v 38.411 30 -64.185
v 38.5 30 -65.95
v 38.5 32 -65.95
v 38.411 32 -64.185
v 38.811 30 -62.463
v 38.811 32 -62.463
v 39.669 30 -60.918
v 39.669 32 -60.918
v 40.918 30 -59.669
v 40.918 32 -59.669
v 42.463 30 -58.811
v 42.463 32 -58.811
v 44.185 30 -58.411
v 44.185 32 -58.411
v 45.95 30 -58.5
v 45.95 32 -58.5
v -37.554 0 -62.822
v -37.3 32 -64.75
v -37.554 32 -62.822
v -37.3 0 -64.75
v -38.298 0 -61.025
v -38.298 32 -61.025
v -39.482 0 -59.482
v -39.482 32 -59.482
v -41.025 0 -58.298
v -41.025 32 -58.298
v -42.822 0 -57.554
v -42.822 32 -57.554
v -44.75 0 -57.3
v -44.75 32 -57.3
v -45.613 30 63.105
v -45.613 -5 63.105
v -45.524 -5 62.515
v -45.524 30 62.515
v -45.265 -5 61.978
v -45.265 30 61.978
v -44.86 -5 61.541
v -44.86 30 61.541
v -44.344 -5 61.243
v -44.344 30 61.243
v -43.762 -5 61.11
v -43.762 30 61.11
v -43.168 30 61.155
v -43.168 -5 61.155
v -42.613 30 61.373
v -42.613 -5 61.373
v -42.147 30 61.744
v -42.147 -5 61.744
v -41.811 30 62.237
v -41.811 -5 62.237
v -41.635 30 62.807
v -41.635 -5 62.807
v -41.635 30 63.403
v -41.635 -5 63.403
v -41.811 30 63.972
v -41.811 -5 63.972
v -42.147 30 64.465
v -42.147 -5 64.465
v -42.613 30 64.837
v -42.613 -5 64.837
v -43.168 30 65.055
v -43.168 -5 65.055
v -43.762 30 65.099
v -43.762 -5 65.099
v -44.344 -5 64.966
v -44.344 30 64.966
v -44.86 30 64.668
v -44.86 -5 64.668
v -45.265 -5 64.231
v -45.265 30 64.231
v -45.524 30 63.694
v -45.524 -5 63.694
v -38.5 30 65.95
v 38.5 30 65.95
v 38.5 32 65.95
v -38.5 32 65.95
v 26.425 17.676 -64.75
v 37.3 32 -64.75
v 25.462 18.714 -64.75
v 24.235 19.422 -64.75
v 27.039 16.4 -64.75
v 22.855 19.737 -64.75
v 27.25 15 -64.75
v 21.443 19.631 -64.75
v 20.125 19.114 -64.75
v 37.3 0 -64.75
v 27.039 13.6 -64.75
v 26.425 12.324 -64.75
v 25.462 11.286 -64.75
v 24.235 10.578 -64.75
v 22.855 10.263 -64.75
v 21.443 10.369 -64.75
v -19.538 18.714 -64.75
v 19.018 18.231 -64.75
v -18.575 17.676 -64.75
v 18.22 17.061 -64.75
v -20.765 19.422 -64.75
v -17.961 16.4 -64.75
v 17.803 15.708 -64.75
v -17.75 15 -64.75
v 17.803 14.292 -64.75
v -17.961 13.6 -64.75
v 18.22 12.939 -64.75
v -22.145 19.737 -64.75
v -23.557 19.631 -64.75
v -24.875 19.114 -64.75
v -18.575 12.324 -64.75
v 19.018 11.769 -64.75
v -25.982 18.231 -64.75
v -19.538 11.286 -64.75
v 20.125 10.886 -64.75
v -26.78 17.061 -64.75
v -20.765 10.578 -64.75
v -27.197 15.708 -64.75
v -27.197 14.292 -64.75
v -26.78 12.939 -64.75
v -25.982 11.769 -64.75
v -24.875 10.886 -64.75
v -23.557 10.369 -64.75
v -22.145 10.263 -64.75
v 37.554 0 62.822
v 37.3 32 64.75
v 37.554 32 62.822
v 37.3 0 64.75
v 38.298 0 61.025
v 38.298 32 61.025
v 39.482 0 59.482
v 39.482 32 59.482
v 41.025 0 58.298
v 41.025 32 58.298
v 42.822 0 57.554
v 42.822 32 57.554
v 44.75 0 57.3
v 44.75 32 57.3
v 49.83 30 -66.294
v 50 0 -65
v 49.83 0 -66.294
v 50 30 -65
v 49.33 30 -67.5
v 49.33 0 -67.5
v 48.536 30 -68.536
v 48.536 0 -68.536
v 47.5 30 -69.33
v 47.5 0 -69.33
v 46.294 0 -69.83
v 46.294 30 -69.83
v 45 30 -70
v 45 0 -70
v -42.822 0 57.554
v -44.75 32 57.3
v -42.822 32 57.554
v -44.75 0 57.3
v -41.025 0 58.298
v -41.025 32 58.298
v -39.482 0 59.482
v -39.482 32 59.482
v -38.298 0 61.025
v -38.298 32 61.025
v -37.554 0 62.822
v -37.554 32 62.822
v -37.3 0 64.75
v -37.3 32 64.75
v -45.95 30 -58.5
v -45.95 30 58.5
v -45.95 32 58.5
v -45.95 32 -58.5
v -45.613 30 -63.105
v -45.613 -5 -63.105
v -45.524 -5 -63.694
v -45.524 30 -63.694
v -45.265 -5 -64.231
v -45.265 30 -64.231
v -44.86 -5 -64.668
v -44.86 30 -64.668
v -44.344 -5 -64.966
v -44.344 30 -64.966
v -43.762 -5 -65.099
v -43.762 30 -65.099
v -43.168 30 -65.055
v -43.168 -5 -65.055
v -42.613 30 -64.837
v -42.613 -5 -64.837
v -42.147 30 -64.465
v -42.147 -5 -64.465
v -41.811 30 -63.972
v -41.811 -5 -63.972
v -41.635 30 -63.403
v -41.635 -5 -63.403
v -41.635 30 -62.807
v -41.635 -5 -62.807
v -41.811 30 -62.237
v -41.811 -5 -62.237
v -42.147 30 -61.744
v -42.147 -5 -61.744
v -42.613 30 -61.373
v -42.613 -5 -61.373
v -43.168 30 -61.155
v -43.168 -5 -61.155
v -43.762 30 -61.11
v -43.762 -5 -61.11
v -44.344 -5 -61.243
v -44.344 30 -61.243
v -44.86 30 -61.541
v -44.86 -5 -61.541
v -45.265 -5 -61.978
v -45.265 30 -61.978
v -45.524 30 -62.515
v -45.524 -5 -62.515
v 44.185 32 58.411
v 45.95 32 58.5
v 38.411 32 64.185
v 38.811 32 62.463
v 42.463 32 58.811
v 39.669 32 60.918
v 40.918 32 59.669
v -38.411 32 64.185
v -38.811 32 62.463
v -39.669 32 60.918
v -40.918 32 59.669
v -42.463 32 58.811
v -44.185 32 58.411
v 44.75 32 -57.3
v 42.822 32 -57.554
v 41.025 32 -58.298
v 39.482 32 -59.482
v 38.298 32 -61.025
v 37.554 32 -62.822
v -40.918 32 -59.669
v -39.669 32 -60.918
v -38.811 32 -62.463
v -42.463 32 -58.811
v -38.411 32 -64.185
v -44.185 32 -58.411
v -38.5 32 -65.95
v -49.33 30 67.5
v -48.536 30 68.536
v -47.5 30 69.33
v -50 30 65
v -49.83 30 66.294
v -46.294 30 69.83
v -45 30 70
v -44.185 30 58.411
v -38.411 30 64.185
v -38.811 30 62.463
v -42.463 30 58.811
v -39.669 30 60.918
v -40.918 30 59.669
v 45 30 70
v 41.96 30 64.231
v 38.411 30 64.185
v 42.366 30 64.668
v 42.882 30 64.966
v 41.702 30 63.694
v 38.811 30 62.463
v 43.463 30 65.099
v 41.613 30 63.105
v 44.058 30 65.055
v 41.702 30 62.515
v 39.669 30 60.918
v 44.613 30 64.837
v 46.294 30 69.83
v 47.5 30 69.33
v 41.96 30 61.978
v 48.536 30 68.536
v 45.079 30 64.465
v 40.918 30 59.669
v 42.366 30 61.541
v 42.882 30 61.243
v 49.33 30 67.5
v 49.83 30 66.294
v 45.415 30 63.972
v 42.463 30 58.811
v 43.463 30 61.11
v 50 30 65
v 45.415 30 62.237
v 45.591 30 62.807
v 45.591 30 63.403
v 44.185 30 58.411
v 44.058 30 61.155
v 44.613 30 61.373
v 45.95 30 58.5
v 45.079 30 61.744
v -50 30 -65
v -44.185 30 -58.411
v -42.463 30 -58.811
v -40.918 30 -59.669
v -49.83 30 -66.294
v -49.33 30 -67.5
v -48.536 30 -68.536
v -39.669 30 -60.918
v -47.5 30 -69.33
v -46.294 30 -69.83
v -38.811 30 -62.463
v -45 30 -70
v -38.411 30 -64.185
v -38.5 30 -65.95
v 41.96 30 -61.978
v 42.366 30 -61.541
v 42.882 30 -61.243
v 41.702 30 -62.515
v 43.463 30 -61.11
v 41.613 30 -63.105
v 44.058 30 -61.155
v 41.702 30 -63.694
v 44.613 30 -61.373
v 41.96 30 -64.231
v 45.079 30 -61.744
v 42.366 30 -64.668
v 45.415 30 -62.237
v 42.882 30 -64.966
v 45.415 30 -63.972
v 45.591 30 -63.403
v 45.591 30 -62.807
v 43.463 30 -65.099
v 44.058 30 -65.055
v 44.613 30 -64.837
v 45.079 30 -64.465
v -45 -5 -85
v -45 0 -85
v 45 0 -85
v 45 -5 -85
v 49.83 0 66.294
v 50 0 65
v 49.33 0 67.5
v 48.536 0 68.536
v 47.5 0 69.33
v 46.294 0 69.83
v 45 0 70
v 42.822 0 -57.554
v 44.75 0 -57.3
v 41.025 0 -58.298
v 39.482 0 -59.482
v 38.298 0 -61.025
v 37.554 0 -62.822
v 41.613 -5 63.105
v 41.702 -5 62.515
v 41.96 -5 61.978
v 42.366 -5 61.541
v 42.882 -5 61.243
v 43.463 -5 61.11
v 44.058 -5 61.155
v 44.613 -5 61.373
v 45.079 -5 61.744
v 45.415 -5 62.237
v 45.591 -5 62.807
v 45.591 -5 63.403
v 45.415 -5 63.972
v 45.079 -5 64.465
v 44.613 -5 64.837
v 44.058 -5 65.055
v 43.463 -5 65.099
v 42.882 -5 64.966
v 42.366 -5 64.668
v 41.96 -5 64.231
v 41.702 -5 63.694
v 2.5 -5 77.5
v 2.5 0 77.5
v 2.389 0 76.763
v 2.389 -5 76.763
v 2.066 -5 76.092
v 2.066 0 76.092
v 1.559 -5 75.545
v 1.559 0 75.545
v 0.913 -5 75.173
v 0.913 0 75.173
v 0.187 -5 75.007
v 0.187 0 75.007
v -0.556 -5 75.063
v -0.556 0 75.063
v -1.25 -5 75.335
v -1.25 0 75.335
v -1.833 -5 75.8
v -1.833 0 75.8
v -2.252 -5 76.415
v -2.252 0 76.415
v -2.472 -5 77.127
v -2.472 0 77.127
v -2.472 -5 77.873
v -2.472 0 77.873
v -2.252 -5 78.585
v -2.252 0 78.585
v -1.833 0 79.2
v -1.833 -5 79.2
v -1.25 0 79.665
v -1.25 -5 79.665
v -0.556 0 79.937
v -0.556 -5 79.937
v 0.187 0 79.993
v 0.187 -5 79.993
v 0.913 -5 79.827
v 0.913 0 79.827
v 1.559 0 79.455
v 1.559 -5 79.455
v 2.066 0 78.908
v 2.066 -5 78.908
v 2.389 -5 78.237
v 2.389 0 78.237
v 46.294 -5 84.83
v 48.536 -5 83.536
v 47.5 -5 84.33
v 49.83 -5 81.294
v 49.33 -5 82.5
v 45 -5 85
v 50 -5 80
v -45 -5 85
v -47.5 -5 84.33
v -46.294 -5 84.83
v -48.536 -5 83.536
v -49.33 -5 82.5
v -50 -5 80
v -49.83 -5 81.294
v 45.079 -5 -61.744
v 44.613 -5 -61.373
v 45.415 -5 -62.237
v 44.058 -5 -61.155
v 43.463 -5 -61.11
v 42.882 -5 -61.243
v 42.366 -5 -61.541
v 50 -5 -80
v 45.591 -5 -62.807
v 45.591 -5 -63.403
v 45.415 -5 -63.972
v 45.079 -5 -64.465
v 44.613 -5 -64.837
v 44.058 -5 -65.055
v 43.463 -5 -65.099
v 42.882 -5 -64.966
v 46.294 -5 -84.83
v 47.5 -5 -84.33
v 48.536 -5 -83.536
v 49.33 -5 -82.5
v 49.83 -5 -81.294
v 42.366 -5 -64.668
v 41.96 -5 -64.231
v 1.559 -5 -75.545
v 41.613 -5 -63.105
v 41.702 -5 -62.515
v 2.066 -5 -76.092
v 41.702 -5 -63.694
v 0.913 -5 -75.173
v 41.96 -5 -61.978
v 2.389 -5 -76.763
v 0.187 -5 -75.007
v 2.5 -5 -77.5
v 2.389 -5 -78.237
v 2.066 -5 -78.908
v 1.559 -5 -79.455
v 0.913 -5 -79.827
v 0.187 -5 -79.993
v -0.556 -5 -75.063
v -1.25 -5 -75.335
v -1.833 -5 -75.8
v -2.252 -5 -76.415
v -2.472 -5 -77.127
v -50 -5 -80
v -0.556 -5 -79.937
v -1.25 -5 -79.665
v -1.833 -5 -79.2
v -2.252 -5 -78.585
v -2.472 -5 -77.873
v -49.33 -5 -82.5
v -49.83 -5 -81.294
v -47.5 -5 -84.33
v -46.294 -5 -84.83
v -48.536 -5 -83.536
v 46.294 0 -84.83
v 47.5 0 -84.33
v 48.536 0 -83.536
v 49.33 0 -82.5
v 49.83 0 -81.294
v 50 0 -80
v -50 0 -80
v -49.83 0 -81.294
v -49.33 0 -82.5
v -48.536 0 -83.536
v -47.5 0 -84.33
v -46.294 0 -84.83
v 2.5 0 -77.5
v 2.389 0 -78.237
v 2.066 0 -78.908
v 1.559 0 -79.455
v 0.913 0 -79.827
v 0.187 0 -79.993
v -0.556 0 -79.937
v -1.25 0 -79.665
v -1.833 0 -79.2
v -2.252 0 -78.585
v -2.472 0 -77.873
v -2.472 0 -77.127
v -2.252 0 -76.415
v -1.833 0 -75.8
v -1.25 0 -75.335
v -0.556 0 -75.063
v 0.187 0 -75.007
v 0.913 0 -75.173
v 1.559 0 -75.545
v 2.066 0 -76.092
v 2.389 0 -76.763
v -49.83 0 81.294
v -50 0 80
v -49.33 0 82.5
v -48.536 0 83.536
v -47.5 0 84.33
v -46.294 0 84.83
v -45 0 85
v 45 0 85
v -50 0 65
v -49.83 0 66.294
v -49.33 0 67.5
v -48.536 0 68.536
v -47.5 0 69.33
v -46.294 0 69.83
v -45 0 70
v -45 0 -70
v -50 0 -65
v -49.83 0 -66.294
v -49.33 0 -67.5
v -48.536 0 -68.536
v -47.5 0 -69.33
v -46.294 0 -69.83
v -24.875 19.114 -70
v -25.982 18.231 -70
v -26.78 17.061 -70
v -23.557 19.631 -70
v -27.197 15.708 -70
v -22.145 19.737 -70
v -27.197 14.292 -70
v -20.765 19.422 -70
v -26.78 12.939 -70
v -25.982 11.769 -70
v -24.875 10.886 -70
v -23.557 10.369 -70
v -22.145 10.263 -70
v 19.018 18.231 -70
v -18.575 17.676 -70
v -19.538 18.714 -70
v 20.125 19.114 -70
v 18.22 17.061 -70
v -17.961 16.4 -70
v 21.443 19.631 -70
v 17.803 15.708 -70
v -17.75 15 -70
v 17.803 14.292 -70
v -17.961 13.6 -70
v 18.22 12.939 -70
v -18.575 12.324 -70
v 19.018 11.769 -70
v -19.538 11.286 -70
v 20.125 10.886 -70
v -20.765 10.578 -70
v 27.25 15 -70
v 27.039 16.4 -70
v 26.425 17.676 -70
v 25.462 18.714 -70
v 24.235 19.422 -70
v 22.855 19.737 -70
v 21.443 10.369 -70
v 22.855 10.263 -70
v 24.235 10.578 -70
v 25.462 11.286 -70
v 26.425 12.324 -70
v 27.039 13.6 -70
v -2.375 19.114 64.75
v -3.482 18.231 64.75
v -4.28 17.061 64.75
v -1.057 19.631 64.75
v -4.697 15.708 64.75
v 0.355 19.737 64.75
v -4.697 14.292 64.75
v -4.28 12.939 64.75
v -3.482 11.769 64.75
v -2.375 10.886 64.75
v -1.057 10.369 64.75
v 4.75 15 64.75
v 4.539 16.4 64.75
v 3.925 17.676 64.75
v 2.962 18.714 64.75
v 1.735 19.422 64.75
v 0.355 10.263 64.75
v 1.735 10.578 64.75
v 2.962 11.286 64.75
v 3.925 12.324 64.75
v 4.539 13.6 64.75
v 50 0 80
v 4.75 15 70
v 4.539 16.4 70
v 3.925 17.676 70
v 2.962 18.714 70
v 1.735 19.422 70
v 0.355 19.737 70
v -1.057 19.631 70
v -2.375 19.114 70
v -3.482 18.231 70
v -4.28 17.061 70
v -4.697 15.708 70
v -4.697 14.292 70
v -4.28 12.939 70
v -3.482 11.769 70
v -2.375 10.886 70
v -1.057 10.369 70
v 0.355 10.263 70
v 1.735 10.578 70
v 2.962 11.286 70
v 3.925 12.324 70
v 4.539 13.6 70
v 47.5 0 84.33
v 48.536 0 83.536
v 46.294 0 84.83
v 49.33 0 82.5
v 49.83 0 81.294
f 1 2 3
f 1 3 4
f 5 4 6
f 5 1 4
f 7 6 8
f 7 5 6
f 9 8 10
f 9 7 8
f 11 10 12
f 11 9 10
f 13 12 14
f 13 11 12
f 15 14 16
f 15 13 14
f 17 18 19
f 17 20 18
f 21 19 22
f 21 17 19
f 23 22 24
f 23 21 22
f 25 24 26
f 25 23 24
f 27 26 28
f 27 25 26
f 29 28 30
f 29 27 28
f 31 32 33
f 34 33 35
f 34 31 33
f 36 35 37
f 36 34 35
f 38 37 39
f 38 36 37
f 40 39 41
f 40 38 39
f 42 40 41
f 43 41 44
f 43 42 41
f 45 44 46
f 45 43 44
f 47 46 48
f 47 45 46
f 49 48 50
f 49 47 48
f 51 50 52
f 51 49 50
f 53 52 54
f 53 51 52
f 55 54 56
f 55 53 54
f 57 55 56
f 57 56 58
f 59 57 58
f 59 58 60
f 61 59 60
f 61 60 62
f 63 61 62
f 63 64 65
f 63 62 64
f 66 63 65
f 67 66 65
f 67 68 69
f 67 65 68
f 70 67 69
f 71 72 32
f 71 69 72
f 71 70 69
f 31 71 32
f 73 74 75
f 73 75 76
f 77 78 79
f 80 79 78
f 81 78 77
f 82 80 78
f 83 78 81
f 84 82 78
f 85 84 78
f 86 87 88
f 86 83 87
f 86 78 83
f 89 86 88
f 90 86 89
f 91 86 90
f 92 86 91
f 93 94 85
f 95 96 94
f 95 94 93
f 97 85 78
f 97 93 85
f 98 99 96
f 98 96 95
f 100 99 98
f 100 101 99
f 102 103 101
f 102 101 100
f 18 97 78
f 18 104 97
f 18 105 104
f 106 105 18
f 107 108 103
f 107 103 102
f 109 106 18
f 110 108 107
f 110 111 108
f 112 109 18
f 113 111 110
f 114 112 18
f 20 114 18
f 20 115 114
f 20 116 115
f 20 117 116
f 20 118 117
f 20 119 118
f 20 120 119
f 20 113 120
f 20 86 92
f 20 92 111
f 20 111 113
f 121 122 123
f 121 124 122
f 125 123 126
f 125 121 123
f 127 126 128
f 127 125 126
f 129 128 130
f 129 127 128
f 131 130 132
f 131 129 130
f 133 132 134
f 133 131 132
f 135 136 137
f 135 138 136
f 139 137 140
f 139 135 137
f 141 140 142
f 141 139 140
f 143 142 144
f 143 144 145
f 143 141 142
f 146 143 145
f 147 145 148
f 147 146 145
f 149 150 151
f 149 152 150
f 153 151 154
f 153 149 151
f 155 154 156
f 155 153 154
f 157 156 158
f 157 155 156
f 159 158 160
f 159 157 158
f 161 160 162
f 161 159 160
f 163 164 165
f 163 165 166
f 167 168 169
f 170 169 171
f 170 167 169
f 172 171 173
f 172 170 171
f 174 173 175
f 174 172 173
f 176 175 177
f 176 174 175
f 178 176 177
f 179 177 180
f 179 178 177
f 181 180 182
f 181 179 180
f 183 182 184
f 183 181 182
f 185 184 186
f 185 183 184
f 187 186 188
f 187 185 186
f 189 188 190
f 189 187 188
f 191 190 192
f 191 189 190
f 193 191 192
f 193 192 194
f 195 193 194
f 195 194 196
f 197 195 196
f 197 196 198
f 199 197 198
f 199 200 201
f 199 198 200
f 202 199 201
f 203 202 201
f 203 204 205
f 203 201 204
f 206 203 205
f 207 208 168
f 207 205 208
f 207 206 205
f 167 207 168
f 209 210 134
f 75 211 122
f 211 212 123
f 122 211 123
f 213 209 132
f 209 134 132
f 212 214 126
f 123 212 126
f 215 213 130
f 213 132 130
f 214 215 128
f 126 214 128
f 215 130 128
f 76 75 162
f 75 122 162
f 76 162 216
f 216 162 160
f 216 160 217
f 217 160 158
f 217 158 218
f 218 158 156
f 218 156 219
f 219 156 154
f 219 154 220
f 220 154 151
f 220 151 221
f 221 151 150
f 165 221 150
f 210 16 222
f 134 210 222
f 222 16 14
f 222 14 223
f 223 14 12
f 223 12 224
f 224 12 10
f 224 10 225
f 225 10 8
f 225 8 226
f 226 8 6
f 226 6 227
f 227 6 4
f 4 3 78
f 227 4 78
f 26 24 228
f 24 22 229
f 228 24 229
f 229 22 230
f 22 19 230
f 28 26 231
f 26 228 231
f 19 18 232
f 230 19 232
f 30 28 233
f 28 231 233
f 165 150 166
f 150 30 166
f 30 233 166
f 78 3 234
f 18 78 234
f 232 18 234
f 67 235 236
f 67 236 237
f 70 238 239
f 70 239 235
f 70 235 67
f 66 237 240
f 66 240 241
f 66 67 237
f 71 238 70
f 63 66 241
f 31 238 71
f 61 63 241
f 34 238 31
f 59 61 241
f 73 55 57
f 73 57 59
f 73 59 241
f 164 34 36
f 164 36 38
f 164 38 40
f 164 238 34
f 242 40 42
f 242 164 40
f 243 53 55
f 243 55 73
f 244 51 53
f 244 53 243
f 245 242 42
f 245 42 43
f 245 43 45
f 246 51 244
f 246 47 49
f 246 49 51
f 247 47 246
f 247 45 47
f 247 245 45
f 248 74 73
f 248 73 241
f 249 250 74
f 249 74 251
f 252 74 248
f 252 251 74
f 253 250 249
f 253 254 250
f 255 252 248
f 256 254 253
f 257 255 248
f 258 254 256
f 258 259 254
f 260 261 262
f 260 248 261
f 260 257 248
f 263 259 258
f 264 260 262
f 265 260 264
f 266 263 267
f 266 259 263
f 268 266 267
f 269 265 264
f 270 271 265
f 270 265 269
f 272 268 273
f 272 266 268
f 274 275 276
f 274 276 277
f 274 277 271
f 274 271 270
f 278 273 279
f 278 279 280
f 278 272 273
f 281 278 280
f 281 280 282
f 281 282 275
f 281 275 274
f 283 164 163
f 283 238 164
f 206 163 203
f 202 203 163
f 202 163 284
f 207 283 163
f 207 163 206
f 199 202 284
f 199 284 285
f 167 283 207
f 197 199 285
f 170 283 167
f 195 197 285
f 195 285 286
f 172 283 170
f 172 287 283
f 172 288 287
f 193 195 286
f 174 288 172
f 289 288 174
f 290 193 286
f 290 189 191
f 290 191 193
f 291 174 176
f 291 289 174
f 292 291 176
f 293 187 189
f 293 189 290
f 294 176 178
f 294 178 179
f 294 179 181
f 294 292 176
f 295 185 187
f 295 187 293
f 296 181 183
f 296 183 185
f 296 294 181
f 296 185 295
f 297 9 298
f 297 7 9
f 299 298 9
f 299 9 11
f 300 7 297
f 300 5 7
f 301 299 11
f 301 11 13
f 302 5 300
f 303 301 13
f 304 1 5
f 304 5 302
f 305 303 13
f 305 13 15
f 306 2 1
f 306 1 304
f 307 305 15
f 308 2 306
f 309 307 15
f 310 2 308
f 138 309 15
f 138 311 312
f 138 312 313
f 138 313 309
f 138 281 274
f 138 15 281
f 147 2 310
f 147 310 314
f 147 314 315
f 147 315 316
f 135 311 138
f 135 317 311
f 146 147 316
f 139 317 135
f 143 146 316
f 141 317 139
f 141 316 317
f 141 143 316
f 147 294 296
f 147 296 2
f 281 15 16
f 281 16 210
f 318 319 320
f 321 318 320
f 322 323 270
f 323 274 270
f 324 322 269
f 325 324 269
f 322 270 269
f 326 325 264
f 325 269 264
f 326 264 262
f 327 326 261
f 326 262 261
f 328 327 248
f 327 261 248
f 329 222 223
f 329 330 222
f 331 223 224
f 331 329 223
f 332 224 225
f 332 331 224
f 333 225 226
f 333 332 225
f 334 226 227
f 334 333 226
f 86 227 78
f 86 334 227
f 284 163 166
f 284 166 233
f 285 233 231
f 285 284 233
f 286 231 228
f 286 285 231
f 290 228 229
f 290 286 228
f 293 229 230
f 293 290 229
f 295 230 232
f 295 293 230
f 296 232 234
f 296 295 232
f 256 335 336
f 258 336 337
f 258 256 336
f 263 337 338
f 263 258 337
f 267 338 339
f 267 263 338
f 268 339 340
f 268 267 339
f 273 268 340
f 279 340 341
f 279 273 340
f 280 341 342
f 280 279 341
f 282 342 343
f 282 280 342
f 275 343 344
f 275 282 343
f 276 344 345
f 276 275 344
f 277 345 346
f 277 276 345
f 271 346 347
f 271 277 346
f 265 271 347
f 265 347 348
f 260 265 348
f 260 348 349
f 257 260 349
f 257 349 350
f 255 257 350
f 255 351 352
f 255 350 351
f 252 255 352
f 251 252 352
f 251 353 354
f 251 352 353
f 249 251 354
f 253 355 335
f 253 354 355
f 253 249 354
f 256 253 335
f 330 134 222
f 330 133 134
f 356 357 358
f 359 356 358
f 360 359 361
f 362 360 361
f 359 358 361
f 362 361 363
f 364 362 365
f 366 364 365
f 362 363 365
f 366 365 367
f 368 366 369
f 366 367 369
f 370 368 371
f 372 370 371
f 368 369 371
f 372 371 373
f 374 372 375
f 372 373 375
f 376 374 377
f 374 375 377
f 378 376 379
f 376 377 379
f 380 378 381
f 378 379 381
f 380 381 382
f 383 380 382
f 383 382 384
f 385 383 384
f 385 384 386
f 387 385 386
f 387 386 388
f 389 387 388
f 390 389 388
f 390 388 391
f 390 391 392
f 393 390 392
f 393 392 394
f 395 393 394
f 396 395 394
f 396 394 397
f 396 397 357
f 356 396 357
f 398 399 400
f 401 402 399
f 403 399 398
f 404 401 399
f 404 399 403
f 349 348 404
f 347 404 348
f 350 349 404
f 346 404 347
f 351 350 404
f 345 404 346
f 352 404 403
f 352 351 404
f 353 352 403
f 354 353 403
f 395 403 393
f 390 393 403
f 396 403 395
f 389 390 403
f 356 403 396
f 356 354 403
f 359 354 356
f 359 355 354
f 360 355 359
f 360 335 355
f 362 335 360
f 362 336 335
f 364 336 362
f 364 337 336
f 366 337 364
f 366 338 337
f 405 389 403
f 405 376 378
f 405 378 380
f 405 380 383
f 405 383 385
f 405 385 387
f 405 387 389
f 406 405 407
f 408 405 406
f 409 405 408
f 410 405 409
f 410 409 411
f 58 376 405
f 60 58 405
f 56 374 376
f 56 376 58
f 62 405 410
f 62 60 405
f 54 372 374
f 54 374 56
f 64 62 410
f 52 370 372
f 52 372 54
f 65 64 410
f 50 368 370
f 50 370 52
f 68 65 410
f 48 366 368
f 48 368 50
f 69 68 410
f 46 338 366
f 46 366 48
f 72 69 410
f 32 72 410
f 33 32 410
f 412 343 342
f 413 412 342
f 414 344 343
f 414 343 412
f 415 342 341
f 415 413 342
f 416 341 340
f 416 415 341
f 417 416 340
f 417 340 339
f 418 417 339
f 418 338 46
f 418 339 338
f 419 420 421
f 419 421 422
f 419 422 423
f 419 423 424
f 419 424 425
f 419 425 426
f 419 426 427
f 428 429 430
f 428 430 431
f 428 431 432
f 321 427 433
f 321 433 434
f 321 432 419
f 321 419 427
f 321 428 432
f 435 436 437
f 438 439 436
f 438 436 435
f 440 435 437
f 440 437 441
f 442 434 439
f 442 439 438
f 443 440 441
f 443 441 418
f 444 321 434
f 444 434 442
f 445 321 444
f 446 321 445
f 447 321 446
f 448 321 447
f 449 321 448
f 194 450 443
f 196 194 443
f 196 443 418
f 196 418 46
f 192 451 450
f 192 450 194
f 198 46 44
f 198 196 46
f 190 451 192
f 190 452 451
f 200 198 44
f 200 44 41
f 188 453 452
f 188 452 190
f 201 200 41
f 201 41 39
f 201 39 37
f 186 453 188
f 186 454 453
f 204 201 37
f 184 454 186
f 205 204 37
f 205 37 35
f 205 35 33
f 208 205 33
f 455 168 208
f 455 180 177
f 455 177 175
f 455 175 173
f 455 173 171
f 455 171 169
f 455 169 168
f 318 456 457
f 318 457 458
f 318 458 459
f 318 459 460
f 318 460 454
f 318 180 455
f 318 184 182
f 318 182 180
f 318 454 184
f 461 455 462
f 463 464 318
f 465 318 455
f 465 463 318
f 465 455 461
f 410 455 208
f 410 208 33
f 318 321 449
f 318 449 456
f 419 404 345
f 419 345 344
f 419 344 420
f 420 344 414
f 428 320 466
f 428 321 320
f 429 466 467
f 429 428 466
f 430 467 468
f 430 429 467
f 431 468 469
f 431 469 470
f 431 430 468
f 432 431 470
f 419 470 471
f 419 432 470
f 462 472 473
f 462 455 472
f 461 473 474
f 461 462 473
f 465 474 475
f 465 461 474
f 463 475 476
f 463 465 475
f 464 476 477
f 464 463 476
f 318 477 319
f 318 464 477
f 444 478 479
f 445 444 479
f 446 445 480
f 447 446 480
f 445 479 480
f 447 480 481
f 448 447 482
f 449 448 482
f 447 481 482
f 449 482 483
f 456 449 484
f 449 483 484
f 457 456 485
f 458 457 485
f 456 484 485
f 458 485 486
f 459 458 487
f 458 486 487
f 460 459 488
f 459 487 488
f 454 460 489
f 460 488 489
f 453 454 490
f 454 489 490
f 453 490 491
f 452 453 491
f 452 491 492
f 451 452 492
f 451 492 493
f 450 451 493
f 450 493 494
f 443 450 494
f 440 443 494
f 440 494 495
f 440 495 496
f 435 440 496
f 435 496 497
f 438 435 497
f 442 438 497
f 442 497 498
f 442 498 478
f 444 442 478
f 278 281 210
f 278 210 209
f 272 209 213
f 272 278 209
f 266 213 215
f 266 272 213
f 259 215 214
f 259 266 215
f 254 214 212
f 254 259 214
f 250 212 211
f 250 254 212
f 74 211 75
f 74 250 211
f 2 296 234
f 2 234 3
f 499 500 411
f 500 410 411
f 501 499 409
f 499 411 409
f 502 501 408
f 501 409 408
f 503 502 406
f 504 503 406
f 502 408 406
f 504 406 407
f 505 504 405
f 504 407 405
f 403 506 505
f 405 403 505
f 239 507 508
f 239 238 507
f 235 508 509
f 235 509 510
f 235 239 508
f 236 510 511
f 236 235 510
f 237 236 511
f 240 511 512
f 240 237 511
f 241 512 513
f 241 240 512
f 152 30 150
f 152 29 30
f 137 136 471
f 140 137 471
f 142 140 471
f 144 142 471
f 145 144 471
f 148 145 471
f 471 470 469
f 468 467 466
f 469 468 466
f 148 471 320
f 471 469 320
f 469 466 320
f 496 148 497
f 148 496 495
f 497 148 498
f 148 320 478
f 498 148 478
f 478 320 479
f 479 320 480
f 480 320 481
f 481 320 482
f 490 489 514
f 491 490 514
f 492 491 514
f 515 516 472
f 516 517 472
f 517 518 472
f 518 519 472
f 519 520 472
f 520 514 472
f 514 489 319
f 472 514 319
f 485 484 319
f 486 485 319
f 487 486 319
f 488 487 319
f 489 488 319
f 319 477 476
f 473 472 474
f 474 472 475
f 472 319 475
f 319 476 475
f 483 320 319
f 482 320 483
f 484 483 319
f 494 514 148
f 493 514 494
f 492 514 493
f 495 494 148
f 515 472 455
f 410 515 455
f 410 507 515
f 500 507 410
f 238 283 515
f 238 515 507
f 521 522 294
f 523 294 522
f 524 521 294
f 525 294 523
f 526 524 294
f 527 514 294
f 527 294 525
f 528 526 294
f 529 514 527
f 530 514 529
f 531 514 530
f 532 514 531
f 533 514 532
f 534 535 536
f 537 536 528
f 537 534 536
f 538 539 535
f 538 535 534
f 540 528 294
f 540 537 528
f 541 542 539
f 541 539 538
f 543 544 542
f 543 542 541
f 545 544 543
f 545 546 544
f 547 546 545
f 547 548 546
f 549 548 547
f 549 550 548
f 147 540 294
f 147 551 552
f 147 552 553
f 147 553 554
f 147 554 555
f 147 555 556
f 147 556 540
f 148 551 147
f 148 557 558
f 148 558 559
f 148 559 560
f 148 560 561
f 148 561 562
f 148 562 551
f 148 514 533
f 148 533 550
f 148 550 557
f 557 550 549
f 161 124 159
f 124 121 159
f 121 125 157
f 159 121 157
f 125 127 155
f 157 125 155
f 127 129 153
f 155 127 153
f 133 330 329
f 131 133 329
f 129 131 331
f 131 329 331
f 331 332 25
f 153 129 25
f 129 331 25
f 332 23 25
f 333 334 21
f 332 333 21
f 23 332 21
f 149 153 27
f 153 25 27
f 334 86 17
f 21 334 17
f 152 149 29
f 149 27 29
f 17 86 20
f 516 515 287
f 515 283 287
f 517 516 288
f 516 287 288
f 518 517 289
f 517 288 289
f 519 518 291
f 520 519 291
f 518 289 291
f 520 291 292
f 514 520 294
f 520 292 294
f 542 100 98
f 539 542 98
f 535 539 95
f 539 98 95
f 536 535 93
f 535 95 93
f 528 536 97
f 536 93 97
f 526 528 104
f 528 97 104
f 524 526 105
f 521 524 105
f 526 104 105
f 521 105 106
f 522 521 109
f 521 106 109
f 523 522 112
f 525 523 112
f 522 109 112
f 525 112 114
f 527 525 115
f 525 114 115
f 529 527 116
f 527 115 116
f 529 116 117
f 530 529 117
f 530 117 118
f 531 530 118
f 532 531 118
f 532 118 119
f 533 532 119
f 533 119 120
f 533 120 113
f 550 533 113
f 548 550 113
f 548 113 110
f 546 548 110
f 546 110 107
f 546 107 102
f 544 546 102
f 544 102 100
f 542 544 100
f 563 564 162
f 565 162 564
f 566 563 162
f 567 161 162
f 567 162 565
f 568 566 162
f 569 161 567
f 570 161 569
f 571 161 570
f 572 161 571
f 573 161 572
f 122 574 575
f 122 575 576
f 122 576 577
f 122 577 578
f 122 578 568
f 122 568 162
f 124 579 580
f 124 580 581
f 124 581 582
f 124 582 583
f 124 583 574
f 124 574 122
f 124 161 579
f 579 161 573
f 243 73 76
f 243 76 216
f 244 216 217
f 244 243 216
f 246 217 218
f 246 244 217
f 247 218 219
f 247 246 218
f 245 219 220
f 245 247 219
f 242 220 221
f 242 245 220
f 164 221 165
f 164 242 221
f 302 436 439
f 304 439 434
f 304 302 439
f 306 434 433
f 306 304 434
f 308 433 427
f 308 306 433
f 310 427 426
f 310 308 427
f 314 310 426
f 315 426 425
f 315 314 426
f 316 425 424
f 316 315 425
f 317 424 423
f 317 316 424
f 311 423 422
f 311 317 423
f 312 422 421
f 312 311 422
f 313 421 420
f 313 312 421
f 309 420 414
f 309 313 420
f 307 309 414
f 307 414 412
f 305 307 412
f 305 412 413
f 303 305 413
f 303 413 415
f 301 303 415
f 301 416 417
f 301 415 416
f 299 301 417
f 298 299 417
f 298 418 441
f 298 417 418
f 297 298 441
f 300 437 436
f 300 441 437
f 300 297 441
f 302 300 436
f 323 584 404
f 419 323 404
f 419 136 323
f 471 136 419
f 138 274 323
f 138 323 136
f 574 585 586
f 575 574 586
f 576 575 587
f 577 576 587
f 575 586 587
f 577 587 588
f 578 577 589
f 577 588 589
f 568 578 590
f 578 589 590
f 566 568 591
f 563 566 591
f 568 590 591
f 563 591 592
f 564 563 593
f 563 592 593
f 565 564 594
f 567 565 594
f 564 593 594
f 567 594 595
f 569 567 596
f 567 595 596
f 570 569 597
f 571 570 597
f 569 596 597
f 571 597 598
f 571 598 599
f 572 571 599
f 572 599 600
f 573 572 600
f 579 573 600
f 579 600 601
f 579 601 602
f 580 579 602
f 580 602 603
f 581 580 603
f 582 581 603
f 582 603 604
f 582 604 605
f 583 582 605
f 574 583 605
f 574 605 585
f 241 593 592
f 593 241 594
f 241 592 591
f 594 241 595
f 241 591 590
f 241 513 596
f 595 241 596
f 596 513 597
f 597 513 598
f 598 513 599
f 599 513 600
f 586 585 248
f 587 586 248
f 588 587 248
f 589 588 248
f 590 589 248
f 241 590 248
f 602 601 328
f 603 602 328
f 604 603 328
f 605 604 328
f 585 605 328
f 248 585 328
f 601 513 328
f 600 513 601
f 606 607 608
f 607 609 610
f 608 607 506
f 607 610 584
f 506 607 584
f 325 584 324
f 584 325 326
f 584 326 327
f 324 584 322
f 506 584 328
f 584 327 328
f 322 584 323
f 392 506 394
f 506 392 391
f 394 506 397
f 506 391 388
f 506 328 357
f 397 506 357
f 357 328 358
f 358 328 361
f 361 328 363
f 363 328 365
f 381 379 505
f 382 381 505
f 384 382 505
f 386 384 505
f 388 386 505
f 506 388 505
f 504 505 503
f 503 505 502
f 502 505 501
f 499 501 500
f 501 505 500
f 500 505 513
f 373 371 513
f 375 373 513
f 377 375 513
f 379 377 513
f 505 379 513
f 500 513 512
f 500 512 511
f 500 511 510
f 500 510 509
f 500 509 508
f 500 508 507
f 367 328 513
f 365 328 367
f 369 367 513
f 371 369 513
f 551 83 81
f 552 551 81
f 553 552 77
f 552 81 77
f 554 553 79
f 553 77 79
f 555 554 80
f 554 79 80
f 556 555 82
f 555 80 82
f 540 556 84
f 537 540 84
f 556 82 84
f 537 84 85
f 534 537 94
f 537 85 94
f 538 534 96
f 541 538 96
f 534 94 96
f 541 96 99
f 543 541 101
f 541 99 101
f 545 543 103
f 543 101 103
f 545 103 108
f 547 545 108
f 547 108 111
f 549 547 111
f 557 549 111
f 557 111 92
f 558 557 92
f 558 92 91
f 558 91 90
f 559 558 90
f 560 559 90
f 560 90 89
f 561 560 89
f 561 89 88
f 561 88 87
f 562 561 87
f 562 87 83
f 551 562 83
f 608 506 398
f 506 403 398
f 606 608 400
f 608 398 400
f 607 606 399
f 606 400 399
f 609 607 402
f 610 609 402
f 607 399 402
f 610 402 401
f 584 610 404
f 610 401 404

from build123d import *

# Parameters (mm, degrees)
BOTTOM_DEPTH       = 5
WALL_W             = 100
WALL_H             = 140
WALL_W_2           = 89.5
WALL_H_2           = 129.5
WALLS_DEPTH        = 30
MAINFILLET_R       = 5
DRILLHOLES_R       = 2
DRILLING_DEPTH     = 45
GASKET_DEPTH       = 2
SKETCH1_R          = 4.75
CUT_EXTRUDE1_DEPTH = 10
IO_HOLES_R         = 4.75
CUT_EXTRUDE2_DEPTH = 70
SKETCH2_R          = 2.5
CUT_EXTRUDE3_DEPTH = 10


with BuildPart() as part:
    # Base → Bottom (new body)
    with BuildSketch(Plane(origin=(0, 0, 0), x_dir=(1, 0, 0), z_dir=(0, 1, 0))):
        Polygon((-50, -70), (-50, 70), (-50, 85), (50, 85), (50, 70), (50, -70), (50, -85), (-50, -85), align=None)
    extrude(amount=-BOTTOM_DEPTH)

    # Wall → Walls (add)
    with BuildSketch(Plane(origin=(0, 0, 0), x_dir=(1, 0, 0), z_dir=(0, 1, 0))):
        Rectangle(WALL_W, WALL_H)
        Rectangle(WALL_W_2, WALL_H_2, mode=Mode.SUBTRACT)
        with BuildLine():
            Line((-44.75, -57.3), (-44.75, -64.75))
            Line((-44.75, -64.75), (-37.3, -64.75))
            ThreePointArc((-37.3, -64.75), (-39.48205448, -59.48205448), (-44.75, -57.3))
        make_face()
        with BuildLine():
            ThreePointArc((44.75, -57.3), (39.48205448, -59.48205448), (37.3, -64.75))
            Line((37.3, -64.75), (44.75, -64.75))
            Line((44.75, -64.75), (44.75, -57.3))
        make_face()
        with BuildLine():
            Line((-44.75, 64.75), (-44.75, 57.3))
            ThreePointArc((-44.75, 57.3), (-39.48205448, 59.48205448), (-37.3, 64.75))
            Line((-37.3, 64.75), (-44.75, 64.75))
        make_face()
        with BuildLine():
            Line((44.75, 64.75), (37.3, 64.75))
            ThreePointArc((37.3, 64.75), (39.48205448, 59.48205448), (44.75, 57.3))
            Line((44.75, 57.3), (44.75, 64.75))
        make_face()
    extrude(amount=WALLS_DEPTH)

    # MainFillet
    mainfillet_edges = [part.edges().sort_by_distance(p)[0] for p in [
        (-50, -2.5, 85),
        (-50, -2.5, -85),
        (50, -2.5, -85),
        (50, -2.5, 85),
        (-50, 15, 70),
        (50, 15, 70),
        (50, 15, -70),
        (-50, 15, -70),
    ]]
    fillet(mainfillet_edges, radius=MAINFILLET_R)

    # DrillHoles → Drilling (cut)
    with BuildSketch(Plane(origin=(0, 30, 0), x_dir=(-1, 0, 0), z_dir=(0, -1, 0))):
        with Locations((43.612901731, 63.104701387)):
            Circle(DRILLHOLES_R)
        with Locations((43.612901731, -63.104701387)):
            Circle(DRILLHOLES_R)
        with Locations((-43.612901731, -63.104701387)):
            Circle(DRILLHOLES_R)
        with Locations((-43.612901731, 63.104701387)):
            Circle(DRILLHOLES_R)
    extrude(amount=DRILLING_DEPTH, mode=Mode.SUBTRACT)

    # GasketInsert → Gasket (add)
    with BuildSketch(Plane(origin=(0, 30, 0), x_dir=(1, 0, 0), z_dir=(0, 1, 0))):
        with BuildLine():
            Line((-45.95, -58.5), (-45.95, 58.5))
            ThreePointArc((-45.95, 58.5), (-40.249861113, 60.249861113), (-38.5, 65.95))
            Line((-38.5, 65.95), (38.5, 65.95))
            ThreePointArc((38.5, 65.95), (40.249861113, 60.249861113), (45.95, 58.5))
            Line((45.95, 58.5), (45.95, -58.5))
            ThreePointArc((45.95, -58.5), (40.249861113, -60.249861113), (38.5, -65.95))
            Line((38.5, -65.95), (-38.5, -65.95))
            ThreePointArc((-38.5, -65.95), (-40.249861113, -60.249861113), (-45.95, -58.5))
        make_face()
        with BuildLine():
            Line((-37.3, -64.75), (37.3, -64.75))
            ThreePointArc((37.3, -64.75), (39.48205448, -59.48205448), (44.75, -57.3))
            Line((44.75, -57.3), (44.75, 57.3))
            ThreePointArc((44.75, 57.3), (39.48205448, 59.48205448), (37.3, 64.75))
            Line((37.3, 64.75), (-37.3, 64.75))
            ThreePointArc((-37.3, 64.75), (-39.48205448, 59.48205448), (-44.75, 57.3))
            Line((-44.75, 57.3), (-44.75, -57.3))
            ThreePointArc((-44.75, -57.3), (-39.48205448, -59.48205448), (-37.3, -64.75))
        make_face(mode=Mode.SUBTRACT)
    extrude(amount=GASKET_DEPTH)

    # Sketch1 → Cut-Extrude1 (cut)
    with BuildSketch(Plane.XY.offset(70)):
        with Locations((0, 15)):
            Circle(SKETCH1_R)
    extrude(amount=-CUT_EXTRUDE1_DEPTH, mode=Mode.SUBTRACT)

    # IO Holes → Cut-Extrude2 (cut)
    with BuildSketch(Plane.XY):
        with Locations((-22.5, 15)):
            Circle(IO_HOLES_R)
        with Locations((22.5, 15)):
            Circle(IO_HOLES_R)
    extrude(amount=-CUT_EXTRUDE2_DEPTH, mode=Mode.SUBTRACT)

    # Sketch2 → Cut-Extrude3 (cut)
    with BuildSketch(Plane(origin=(0, 0, 0), x_dir=(1, 0, 0), z_dir=(0, 1, 0))):
        with Locations((0, 77.5)):
            Circle(SKETCH2_R)
        with Locations((0, -77.5)):
            Circle(SKETCH2_R)
    extrude(amount=-CUT_EXTRUDE3_DEPTH, mode=Mode.SUBTRACT)


solid = part.part
